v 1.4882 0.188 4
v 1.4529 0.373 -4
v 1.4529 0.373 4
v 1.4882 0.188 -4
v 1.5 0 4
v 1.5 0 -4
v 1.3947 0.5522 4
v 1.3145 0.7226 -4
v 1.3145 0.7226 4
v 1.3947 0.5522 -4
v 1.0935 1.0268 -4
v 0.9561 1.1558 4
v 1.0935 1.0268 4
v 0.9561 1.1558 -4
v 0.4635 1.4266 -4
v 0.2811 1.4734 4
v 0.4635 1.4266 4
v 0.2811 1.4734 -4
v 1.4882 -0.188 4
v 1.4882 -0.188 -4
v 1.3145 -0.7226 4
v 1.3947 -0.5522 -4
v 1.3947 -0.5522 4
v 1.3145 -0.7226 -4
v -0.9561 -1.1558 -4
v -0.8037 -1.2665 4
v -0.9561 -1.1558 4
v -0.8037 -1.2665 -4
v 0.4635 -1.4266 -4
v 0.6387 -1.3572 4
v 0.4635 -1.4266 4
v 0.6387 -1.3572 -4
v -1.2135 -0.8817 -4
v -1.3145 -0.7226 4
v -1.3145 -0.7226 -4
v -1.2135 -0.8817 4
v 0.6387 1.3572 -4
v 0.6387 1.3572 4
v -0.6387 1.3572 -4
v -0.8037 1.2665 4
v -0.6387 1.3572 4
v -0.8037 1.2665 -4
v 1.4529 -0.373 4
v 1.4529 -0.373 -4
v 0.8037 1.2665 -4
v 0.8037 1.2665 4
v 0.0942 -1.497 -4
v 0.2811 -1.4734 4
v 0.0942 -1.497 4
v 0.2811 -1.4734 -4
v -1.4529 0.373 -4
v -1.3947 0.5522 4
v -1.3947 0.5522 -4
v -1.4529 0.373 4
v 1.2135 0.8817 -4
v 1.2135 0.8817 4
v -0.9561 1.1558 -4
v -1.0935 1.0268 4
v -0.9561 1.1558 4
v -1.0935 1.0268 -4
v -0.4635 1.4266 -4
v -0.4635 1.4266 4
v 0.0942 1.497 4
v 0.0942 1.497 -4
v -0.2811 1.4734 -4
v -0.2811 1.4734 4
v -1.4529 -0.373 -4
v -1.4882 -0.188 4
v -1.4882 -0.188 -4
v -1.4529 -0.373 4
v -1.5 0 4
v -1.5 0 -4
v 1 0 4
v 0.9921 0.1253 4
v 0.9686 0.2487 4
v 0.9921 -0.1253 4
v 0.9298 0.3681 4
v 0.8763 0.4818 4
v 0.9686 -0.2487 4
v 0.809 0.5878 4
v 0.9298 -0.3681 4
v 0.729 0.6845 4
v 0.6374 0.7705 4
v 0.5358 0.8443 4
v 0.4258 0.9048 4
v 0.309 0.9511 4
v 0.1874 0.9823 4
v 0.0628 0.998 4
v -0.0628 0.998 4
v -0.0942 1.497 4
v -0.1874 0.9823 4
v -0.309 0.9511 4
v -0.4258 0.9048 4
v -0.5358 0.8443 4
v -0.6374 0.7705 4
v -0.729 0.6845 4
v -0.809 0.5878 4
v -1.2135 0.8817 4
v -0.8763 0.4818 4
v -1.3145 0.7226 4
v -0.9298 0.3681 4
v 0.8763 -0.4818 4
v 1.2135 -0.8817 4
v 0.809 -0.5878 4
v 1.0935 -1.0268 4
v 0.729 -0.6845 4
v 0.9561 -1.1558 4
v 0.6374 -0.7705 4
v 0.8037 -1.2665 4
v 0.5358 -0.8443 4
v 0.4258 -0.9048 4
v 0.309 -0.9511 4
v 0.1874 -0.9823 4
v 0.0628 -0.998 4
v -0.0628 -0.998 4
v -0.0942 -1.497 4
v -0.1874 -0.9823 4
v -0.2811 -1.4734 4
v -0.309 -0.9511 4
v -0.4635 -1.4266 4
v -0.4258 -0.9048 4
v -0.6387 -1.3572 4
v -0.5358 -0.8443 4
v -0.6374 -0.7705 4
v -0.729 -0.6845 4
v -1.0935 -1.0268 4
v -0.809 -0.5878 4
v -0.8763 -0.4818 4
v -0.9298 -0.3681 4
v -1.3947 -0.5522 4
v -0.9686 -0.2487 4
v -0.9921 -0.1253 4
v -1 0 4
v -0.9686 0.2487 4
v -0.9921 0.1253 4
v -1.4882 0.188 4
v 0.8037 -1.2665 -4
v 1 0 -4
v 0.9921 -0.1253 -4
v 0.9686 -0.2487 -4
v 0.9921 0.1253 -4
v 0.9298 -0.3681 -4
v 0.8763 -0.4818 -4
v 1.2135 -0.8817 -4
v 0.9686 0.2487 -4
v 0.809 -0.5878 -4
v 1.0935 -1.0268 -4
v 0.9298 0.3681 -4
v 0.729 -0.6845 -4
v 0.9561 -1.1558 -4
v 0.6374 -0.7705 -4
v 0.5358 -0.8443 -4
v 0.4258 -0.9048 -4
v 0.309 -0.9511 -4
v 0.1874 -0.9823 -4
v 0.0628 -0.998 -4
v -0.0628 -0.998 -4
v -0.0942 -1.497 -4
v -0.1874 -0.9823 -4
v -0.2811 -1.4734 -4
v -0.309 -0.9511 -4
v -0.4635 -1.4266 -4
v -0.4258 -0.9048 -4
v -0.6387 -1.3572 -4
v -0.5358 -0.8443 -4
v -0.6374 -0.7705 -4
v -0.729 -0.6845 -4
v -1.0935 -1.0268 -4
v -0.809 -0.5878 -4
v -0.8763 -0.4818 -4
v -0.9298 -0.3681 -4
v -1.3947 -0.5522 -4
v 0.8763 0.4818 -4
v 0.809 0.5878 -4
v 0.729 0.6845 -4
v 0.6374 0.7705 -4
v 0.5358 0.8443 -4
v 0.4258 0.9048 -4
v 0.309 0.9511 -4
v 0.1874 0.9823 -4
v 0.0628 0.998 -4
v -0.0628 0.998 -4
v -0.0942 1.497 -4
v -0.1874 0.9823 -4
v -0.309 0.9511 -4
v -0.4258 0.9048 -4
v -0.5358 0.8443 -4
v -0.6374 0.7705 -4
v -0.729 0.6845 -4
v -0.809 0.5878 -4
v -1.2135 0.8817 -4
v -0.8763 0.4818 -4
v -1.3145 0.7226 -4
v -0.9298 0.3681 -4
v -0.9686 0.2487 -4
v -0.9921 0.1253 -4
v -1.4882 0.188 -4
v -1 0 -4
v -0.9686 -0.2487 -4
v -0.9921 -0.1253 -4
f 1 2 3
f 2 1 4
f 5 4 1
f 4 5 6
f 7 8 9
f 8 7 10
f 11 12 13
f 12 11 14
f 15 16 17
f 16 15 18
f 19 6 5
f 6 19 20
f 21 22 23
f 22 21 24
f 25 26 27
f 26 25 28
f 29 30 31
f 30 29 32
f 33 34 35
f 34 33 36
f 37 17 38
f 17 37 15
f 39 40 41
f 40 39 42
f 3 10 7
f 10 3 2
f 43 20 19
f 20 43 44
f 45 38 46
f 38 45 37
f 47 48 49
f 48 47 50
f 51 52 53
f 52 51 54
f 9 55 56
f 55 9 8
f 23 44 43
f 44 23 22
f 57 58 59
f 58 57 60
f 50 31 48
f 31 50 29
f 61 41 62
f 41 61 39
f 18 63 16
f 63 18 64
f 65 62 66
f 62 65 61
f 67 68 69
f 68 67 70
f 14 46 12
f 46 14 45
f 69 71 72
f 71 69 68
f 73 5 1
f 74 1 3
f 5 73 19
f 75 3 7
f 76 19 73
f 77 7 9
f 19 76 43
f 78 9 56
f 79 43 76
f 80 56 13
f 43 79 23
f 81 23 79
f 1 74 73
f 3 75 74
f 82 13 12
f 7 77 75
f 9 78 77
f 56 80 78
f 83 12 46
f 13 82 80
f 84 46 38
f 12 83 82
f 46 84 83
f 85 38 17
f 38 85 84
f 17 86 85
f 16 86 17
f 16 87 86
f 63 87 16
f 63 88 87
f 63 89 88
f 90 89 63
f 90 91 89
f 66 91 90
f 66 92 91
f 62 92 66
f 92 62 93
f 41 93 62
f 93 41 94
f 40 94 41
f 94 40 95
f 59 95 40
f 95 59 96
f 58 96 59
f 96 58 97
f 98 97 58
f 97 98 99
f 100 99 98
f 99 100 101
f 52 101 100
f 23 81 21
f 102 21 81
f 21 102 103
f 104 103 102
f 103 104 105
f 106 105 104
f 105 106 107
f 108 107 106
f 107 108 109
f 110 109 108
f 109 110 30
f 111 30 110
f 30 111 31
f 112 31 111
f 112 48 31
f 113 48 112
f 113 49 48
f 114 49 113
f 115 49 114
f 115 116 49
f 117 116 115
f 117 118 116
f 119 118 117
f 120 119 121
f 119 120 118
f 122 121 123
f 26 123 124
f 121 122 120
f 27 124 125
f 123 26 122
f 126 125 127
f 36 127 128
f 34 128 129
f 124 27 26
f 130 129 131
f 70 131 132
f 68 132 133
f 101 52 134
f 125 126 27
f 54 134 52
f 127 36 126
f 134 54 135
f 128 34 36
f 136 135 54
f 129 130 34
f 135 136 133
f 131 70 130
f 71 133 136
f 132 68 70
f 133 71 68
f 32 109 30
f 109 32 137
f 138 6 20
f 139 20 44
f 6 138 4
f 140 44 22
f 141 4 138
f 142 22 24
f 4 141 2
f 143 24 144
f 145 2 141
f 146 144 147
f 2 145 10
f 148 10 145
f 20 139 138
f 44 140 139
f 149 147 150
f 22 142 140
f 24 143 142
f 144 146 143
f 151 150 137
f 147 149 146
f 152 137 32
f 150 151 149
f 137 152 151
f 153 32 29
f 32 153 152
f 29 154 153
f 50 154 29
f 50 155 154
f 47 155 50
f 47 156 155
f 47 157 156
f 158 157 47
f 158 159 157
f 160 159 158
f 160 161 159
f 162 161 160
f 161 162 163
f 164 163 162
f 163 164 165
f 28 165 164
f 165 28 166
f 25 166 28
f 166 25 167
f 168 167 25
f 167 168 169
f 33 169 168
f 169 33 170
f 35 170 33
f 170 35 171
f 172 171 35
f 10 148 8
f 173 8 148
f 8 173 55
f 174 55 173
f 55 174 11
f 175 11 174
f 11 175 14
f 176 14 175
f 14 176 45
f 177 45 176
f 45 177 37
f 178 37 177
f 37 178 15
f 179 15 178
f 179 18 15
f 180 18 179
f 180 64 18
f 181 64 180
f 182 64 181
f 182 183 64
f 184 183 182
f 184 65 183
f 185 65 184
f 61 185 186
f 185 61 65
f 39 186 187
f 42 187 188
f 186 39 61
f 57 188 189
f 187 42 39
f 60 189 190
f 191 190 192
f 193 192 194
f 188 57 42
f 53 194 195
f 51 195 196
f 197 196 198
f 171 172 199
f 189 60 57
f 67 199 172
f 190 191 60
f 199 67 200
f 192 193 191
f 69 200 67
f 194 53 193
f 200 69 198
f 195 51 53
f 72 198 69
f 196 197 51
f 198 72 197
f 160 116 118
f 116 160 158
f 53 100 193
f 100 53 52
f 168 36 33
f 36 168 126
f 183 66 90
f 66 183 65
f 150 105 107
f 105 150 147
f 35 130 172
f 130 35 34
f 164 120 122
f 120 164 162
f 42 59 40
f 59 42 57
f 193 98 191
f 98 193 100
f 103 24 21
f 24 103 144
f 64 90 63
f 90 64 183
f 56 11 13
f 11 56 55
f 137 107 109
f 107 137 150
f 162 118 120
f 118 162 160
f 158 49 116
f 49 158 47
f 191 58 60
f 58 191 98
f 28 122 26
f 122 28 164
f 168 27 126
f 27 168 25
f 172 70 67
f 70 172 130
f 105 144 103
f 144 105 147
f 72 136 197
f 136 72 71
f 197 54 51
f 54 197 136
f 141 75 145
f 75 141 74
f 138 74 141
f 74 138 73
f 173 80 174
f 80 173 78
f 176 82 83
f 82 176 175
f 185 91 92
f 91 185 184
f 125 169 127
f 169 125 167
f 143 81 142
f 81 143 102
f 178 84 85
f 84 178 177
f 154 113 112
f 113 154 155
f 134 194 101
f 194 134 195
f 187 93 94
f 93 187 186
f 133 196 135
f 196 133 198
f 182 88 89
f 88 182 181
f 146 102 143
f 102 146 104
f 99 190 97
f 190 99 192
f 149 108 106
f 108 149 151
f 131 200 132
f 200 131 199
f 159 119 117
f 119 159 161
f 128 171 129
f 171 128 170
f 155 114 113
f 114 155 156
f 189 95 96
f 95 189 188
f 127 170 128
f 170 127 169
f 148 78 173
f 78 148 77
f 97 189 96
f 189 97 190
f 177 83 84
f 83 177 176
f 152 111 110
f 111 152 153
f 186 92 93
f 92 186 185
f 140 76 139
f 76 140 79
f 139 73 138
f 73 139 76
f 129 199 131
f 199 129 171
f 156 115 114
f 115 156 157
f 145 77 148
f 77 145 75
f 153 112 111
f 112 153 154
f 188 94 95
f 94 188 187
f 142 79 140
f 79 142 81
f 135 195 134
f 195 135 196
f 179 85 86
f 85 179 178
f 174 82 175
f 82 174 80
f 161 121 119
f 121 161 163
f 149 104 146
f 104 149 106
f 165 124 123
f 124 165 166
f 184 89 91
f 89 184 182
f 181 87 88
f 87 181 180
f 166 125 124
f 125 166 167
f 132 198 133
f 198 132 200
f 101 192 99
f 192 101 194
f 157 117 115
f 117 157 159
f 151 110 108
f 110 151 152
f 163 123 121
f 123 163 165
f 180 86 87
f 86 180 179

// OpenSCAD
$fn = 50;


difference() {
	union() {
		translate(v = [0, 0, -4.0000000000]) {
			cylinder(h = 8, r = 1.5000000000);
		}
	}
	union() {
		translate(v = [0, 0, -100.0000000000]) {
			cylinder(h = 200, r = 1.0000000000);
		}
	}
}
